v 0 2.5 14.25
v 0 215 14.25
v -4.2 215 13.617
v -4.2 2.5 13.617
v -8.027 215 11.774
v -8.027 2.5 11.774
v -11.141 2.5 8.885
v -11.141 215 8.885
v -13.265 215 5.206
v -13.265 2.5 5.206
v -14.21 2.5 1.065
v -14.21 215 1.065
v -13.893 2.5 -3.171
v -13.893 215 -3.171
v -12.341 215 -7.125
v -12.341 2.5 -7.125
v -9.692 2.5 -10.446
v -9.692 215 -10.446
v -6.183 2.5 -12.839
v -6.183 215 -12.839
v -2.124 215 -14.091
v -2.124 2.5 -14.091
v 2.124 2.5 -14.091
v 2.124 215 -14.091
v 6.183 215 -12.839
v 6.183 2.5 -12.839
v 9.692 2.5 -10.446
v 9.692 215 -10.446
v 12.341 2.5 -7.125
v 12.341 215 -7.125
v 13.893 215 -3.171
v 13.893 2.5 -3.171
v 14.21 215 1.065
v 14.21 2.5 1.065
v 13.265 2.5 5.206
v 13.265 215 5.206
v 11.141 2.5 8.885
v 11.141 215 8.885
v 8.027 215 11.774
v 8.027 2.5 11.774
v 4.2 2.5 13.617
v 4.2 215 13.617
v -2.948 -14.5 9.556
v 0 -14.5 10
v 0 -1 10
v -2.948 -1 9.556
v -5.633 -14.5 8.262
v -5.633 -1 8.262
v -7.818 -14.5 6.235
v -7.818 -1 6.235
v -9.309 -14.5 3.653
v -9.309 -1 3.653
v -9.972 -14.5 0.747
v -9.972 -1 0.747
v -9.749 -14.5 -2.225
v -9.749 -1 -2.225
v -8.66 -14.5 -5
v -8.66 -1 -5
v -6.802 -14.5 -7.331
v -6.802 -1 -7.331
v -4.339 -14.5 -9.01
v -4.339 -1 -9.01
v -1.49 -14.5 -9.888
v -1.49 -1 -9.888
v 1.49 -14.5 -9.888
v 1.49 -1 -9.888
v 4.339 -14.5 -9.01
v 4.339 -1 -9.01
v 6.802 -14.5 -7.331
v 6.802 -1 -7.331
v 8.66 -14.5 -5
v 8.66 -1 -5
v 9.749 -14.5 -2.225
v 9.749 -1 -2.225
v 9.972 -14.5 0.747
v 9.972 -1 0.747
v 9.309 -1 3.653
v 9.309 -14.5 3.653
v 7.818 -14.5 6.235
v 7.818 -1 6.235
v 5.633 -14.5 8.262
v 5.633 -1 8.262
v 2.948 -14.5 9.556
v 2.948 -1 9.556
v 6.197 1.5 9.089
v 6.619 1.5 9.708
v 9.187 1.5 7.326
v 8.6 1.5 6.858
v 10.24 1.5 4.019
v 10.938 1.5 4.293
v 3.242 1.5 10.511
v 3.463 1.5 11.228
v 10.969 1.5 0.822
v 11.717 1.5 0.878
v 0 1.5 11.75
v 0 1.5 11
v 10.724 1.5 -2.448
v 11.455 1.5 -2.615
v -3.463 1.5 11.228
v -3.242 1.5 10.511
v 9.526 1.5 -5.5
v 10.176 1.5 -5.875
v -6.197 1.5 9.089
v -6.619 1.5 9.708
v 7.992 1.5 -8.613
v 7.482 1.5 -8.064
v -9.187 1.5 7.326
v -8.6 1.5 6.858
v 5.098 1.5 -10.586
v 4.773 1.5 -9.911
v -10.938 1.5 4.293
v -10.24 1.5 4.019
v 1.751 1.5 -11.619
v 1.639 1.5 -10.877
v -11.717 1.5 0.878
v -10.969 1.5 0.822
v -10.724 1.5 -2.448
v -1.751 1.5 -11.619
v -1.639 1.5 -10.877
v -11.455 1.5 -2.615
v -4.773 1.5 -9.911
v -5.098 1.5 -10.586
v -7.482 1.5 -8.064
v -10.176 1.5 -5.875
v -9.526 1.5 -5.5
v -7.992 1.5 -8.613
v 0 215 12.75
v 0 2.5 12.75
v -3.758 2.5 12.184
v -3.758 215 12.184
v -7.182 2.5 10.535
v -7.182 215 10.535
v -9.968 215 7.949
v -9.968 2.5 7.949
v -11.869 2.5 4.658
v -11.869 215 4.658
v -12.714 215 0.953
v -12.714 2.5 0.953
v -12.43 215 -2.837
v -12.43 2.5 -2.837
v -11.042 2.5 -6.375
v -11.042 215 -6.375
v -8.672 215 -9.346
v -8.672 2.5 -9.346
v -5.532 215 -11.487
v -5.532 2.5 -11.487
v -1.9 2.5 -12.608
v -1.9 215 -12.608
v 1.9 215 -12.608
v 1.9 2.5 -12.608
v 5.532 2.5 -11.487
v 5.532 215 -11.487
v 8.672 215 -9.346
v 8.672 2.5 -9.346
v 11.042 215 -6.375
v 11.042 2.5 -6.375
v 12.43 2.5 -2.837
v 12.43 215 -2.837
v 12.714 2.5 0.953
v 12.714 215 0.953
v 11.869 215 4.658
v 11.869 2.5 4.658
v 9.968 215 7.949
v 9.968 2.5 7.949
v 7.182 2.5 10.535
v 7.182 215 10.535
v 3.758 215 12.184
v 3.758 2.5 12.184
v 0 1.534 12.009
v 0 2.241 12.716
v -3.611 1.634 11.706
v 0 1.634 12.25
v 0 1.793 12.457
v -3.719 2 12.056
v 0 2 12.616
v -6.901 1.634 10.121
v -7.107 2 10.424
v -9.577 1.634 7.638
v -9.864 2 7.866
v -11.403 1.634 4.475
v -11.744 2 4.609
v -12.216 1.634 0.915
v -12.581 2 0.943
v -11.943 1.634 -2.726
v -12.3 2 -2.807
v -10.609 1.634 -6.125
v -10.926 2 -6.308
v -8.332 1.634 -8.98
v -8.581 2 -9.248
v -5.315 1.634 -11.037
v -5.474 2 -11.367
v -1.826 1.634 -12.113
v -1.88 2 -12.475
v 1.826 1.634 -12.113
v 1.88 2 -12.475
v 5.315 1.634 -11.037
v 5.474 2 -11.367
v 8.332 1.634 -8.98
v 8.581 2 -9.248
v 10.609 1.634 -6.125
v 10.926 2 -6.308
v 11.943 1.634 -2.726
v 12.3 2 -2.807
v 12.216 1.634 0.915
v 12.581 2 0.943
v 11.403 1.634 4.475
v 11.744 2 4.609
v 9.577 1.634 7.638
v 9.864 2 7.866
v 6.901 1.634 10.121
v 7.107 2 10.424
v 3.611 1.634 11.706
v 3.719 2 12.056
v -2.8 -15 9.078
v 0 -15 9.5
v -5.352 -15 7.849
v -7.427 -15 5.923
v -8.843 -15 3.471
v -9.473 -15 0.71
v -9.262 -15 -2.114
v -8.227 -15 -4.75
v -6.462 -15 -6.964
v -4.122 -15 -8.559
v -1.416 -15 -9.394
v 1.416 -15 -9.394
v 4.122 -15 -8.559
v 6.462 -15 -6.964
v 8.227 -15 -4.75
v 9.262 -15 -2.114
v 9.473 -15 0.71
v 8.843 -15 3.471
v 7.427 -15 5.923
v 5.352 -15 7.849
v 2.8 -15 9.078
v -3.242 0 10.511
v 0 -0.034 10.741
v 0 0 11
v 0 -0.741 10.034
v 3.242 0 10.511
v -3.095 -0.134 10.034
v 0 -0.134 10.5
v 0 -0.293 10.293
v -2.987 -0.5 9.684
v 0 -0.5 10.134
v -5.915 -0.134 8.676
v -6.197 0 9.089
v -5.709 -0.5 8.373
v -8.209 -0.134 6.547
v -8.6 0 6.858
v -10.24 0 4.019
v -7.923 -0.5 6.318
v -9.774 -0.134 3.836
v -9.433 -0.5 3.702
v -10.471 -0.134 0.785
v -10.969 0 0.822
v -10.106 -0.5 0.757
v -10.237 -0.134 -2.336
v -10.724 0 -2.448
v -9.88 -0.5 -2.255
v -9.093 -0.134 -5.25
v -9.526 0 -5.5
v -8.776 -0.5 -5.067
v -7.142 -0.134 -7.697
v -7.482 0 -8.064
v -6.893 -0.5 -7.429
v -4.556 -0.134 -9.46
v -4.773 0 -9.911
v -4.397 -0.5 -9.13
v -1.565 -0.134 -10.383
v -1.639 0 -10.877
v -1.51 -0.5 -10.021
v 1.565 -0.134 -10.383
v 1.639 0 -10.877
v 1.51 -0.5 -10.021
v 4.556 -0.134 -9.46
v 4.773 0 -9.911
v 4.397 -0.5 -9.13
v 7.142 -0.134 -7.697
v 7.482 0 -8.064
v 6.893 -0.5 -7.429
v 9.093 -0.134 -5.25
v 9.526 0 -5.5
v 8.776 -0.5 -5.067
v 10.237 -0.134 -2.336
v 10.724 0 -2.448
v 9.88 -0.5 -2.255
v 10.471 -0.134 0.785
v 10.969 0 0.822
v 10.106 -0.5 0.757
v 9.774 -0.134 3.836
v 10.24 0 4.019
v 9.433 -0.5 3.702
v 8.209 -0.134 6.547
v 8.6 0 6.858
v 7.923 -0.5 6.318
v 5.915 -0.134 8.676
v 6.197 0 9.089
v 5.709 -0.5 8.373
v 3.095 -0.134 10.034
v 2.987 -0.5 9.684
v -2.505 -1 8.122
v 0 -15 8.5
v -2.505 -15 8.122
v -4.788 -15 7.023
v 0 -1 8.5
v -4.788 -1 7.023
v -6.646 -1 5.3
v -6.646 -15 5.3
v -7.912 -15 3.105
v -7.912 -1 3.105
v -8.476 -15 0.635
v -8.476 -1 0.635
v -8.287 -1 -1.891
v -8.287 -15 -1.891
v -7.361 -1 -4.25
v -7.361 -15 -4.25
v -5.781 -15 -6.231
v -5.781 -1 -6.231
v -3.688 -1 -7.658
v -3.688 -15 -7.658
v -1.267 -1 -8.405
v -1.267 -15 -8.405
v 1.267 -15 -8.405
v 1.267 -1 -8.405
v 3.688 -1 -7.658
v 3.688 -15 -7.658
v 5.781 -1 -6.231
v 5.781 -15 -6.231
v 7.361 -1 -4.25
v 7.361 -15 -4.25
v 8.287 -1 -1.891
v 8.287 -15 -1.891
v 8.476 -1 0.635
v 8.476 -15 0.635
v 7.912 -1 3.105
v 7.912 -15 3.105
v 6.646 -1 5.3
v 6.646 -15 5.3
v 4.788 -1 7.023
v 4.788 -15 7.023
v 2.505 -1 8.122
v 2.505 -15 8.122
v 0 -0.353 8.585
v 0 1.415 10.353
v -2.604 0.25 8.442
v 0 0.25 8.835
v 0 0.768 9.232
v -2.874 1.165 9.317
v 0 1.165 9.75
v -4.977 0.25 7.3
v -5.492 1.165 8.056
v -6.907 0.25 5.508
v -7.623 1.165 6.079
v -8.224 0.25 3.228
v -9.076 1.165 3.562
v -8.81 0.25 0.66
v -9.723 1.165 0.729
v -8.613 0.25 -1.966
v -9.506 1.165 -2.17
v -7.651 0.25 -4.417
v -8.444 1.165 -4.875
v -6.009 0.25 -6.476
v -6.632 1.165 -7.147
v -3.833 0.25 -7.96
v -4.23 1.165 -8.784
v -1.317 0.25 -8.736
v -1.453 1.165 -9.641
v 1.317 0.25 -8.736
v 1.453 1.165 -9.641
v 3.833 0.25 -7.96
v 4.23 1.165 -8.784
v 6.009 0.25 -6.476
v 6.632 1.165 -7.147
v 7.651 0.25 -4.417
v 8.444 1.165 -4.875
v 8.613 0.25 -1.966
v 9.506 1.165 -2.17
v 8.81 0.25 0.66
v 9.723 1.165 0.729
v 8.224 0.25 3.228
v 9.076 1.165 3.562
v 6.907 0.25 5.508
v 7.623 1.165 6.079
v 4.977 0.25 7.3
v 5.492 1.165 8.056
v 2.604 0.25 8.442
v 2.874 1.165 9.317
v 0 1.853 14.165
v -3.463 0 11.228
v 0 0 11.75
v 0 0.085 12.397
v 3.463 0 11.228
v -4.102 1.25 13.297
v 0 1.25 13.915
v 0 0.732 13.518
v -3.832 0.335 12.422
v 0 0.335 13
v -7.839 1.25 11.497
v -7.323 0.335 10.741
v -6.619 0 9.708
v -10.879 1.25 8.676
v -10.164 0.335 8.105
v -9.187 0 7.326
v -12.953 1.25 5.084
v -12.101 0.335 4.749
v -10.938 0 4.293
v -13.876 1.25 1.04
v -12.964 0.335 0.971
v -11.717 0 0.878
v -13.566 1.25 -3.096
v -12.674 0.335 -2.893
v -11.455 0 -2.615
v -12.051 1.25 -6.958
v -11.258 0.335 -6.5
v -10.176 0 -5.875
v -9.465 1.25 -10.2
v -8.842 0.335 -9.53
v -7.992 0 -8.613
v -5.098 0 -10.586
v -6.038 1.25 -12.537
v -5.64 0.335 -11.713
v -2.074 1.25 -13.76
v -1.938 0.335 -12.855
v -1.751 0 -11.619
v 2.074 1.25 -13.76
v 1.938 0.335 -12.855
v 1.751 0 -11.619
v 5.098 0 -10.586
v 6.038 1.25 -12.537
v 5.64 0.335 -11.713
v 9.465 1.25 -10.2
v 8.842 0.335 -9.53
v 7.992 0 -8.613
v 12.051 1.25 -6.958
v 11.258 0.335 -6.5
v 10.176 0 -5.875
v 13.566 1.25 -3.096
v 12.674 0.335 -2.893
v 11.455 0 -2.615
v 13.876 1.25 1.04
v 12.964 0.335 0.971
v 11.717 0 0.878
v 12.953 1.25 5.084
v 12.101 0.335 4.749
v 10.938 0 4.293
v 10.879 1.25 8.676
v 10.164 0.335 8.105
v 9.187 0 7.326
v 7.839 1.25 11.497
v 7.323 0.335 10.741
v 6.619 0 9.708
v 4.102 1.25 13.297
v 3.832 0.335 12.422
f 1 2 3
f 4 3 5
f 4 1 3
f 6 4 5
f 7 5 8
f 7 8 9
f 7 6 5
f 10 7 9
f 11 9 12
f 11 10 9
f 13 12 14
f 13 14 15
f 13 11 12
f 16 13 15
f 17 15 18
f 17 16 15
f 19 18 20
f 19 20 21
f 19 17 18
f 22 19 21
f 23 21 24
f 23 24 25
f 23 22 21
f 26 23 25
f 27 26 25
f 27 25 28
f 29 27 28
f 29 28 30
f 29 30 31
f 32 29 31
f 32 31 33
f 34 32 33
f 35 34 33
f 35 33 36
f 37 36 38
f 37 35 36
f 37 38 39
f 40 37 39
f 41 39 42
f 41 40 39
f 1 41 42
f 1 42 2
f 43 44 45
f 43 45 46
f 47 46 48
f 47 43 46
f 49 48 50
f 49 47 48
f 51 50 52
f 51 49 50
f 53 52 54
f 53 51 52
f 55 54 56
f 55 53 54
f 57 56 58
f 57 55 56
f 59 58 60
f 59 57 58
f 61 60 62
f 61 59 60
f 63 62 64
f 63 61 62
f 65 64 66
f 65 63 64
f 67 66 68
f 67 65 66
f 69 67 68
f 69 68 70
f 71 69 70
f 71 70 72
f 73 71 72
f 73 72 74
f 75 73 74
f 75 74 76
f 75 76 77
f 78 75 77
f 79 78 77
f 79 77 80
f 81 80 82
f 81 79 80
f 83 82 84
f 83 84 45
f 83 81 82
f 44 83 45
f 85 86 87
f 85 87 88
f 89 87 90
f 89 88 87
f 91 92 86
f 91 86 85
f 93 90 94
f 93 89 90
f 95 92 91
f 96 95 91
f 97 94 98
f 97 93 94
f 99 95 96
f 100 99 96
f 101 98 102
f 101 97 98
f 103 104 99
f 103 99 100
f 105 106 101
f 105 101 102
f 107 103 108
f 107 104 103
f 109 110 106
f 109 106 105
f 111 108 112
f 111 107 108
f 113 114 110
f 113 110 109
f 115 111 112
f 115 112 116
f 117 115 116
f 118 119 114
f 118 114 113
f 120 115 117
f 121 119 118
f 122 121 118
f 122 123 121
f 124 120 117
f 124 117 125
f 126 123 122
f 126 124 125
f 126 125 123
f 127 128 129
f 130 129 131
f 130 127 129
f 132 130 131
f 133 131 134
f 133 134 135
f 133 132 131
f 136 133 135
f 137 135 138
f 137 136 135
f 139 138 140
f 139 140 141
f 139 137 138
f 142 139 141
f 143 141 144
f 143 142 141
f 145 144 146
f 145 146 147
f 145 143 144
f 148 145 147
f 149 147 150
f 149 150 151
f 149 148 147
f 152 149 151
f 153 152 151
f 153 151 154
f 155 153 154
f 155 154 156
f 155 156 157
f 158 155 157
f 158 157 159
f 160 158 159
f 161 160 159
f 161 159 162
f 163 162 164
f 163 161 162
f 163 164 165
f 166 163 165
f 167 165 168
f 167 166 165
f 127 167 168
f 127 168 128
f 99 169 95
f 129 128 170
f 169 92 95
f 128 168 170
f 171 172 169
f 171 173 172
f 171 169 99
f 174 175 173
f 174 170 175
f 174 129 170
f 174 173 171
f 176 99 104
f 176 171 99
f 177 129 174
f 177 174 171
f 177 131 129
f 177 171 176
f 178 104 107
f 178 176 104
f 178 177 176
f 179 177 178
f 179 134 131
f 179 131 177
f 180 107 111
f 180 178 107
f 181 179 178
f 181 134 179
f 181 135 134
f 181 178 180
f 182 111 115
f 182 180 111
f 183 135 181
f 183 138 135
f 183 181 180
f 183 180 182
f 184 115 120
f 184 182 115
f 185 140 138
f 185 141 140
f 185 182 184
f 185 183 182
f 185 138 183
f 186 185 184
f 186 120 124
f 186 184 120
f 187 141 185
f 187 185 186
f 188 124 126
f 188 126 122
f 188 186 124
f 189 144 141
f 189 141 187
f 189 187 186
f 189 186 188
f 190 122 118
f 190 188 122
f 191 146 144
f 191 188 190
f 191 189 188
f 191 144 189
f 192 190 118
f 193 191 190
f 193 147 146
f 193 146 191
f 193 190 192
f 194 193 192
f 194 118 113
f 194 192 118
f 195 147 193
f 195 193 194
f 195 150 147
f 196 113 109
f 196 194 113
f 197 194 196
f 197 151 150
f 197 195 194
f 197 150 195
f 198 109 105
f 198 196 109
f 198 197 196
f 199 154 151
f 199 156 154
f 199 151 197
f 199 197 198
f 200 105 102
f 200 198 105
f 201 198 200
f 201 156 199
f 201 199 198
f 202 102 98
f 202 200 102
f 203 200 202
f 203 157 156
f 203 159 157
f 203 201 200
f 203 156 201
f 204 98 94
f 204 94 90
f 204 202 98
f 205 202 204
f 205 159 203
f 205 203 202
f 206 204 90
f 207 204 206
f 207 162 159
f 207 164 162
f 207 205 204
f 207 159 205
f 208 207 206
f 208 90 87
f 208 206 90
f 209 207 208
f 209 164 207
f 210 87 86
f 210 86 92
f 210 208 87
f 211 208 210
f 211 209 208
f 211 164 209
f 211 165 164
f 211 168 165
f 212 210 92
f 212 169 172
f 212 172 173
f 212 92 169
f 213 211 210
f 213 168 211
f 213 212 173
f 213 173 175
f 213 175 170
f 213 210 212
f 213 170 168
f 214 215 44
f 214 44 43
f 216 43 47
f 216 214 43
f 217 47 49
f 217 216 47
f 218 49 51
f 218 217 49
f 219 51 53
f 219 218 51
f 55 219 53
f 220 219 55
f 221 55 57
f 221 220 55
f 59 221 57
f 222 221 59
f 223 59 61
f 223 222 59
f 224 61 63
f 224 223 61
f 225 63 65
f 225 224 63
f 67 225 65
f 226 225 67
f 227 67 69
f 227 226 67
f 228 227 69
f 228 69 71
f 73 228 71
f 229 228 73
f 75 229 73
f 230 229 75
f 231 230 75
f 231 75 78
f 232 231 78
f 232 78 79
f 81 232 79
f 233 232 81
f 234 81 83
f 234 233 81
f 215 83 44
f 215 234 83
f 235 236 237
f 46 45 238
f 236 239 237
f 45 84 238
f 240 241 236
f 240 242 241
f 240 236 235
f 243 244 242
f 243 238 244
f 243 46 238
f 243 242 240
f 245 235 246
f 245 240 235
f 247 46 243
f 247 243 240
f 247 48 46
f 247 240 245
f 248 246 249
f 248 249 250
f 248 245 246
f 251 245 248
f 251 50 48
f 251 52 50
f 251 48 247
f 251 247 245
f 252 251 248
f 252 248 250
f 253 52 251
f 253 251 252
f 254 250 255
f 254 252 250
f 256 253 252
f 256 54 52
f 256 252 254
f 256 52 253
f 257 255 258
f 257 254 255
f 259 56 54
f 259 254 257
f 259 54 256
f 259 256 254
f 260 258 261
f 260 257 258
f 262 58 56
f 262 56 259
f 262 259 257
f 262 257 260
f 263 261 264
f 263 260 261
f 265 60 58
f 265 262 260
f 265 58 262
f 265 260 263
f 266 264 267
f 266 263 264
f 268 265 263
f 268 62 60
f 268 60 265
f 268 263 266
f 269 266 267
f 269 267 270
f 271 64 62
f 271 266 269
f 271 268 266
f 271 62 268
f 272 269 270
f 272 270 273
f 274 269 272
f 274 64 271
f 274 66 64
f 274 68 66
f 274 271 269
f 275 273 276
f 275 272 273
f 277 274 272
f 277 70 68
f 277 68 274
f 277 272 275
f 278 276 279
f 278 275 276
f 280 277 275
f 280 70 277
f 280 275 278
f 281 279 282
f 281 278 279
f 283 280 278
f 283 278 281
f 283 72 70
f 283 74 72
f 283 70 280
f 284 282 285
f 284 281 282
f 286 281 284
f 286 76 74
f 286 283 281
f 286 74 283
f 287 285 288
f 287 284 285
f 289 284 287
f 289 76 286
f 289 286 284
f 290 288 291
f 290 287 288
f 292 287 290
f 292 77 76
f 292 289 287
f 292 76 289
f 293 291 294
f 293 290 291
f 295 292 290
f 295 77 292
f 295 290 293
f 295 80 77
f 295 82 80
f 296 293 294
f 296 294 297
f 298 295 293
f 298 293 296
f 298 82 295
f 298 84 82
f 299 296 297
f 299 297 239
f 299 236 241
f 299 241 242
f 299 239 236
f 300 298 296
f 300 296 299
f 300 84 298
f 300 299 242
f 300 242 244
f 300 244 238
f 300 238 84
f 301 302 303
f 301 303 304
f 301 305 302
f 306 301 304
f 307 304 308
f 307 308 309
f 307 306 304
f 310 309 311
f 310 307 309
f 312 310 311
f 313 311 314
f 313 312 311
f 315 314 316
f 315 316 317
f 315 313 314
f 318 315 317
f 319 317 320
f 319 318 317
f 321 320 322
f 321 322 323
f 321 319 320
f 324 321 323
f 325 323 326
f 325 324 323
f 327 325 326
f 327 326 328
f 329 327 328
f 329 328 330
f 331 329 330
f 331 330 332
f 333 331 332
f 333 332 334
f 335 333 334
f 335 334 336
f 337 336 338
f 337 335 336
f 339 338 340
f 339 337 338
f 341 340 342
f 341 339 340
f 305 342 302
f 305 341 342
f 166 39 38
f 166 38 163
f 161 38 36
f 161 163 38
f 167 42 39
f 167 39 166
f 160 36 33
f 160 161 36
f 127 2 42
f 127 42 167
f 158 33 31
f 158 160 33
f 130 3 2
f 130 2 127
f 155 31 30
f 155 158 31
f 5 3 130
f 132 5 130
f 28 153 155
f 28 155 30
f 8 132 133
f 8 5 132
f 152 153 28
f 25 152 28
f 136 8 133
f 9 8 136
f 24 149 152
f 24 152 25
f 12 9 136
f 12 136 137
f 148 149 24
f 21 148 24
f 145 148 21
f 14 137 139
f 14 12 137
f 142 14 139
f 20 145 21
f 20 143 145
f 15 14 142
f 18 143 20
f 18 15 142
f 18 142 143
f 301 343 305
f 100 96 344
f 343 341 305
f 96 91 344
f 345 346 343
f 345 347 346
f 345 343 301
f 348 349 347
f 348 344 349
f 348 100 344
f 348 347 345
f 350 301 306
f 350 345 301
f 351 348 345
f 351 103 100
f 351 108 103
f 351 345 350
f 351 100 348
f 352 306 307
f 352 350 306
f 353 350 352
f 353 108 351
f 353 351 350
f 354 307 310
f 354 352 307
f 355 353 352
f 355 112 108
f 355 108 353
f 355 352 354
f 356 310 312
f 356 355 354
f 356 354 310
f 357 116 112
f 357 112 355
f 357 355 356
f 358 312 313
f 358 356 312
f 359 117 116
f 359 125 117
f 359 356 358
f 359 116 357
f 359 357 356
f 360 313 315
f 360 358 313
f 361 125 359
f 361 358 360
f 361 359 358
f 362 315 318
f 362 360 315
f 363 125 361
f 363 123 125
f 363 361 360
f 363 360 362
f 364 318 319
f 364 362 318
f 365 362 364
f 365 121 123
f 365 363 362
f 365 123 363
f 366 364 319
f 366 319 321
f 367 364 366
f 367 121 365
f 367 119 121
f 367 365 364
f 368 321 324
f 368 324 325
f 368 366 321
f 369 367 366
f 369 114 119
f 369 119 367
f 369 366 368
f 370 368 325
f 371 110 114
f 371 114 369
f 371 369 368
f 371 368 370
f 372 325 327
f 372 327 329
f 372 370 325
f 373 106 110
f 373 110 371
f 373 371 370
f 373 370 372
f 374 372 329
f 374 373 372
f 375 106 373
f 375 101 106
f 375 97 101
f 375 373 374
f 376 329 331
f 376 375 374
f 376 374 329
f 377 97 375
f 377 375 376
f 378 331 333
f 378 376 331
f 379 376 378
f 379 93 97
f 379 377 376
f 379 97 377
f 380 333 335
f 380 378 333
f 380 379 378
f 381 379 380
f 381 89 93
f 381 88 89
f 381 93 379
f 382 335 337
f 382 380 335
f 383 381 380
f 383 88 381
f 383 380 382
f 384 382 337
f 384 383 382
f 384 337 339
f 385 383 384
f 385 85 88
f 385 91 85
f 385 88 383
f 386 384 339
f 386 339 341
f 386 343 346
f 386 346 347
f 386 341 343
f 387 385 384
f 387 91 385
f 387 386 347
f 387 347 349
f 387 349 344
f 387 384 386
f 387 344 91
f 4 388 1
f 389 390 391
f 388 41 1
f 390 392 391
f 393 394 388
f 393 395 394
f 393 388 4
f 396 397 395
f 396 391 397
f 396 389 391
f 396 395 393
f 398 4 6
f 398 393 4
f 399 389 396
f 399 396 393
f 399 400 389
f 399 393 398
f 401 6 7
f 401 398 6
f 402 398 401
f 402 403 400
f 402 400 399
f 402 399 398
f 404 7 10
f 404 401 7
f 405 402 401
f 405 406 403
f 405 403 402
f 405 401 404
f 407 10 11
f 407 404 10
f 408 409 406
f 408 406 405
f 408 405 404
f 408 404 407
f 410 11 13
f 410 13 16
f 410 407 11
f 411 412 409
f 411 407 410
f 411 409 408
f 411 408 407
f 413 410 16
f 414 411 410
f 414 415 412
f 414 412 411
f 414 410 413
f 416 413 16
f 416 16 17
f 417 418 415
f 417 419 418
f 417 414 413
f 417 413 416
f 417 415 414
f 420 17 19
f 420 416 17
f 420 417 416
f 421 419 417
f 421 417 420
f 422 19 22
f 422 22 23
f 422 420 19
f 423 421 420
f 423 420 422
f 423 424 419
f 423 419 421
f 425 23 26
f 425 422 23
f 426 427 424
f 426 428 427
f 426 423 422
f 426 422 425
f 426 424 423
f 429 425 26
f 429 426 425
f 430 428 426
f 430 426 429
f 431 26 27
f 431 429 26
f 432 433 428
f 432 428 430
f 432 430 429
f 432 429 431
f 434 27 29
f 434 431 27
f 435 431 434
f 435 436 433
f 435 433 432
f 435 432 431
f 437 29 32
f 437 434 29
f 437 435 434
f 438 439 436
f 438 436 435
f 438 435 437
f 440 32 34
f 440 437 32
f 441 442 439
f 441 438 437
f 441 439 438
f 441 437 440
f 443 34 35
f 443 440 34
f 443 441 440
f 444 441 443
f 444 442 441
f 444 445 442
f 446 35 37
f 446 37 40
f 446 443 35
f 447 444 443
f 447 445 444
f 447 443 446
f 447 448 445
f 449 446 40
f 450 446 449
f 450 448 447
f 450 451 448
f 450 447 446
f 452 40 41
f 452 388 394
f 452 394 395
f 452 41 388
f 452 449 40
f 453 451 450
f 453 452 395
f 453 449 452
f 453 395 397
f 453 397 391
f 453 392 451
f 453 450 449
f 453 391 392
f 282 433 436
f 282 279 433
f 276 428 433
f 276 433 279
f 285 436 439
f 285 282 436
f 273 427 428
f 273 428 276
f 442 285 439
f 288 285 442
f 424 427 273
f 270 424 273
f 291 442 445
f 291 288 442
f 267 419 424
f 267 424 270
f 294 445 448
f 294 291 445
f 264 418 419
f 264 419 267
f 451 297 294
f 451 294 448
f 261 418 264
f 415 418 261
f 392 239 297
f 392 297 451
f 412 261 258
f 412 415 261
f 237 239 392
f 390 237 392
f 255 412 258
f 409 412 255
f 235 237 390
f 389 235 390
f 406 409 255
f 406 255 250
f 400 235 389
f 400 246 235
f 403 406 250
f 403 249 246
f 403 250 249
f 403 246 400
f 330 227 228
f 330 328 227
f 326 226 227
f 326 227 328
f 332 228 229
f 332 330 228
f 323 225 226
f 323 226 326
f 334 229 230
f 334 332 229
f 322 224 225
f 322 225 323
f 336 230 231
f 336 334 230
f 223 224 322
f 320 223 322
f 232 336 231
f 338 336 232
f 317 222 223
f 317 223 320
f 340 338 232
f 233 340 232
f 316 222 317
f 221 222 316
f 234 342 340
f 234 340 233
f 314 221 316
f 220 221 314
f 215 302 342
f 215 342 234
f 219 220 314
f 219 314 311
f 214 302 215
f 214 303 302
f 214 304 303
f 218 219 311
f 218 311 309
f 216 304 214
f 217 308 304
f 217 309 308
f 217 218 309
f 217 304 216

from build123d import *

# Parameters (mm, degrees)
CHANFREIN1_SIZE = 0.5


with BuildPart() as part:
    # Esquisse1 → Révolution1 (revolve)
    with BuildSketch(Plane.XY, mode=Mode.PRIVATE) as r_volution1_sk:
        with BuildLine():
            Line((8.5, -15), (8.5, -1))
            ThreePointArc((8.5, -1), (9.232233047, 0.767766953), (11, 1.5))
            Line((11, 1.5), (11.75, 1.5))
            ThreePointArc((11.75, 1.5), (12.457106781, 1.792893219), (12.75, 2.5))
            Line((12.75, 2.5), (12.75, 215))
            Line((12.75, 215), (14.25, 215))
            Line((14.25, 215), (14.25, 2.5))
            ThreePointArc((14.25, 2.5), (13.517766953, 0.732233047), (11.75, 0))
            Line((11.75, 0), (11, 0))
            ThreePointArc((11, 0), (10.292893219, -0.292893219), (10, -1))
            Line((10, -1), (10, -15))
            Line((10, -15), (8.5, -15))
        make_face()
    revolve(r_volution1_sk.sketch.rotate(Axis((0, 34.901303155, 0), (0, -1, 0)), 90), axis=Axis((0, 34.901303155, 0), (0, -1, 0)))  # turned: the seam where the file's is

    # Chanfrein1
    chanfrein1_edges = [part.edges().sort_by_distance(p)[0] for p in [
        (0, -15, -10),
    ]]
    chamfer(chanfrein1_edges, length=CHANFREIN1_SIZE)


solid = part.part
